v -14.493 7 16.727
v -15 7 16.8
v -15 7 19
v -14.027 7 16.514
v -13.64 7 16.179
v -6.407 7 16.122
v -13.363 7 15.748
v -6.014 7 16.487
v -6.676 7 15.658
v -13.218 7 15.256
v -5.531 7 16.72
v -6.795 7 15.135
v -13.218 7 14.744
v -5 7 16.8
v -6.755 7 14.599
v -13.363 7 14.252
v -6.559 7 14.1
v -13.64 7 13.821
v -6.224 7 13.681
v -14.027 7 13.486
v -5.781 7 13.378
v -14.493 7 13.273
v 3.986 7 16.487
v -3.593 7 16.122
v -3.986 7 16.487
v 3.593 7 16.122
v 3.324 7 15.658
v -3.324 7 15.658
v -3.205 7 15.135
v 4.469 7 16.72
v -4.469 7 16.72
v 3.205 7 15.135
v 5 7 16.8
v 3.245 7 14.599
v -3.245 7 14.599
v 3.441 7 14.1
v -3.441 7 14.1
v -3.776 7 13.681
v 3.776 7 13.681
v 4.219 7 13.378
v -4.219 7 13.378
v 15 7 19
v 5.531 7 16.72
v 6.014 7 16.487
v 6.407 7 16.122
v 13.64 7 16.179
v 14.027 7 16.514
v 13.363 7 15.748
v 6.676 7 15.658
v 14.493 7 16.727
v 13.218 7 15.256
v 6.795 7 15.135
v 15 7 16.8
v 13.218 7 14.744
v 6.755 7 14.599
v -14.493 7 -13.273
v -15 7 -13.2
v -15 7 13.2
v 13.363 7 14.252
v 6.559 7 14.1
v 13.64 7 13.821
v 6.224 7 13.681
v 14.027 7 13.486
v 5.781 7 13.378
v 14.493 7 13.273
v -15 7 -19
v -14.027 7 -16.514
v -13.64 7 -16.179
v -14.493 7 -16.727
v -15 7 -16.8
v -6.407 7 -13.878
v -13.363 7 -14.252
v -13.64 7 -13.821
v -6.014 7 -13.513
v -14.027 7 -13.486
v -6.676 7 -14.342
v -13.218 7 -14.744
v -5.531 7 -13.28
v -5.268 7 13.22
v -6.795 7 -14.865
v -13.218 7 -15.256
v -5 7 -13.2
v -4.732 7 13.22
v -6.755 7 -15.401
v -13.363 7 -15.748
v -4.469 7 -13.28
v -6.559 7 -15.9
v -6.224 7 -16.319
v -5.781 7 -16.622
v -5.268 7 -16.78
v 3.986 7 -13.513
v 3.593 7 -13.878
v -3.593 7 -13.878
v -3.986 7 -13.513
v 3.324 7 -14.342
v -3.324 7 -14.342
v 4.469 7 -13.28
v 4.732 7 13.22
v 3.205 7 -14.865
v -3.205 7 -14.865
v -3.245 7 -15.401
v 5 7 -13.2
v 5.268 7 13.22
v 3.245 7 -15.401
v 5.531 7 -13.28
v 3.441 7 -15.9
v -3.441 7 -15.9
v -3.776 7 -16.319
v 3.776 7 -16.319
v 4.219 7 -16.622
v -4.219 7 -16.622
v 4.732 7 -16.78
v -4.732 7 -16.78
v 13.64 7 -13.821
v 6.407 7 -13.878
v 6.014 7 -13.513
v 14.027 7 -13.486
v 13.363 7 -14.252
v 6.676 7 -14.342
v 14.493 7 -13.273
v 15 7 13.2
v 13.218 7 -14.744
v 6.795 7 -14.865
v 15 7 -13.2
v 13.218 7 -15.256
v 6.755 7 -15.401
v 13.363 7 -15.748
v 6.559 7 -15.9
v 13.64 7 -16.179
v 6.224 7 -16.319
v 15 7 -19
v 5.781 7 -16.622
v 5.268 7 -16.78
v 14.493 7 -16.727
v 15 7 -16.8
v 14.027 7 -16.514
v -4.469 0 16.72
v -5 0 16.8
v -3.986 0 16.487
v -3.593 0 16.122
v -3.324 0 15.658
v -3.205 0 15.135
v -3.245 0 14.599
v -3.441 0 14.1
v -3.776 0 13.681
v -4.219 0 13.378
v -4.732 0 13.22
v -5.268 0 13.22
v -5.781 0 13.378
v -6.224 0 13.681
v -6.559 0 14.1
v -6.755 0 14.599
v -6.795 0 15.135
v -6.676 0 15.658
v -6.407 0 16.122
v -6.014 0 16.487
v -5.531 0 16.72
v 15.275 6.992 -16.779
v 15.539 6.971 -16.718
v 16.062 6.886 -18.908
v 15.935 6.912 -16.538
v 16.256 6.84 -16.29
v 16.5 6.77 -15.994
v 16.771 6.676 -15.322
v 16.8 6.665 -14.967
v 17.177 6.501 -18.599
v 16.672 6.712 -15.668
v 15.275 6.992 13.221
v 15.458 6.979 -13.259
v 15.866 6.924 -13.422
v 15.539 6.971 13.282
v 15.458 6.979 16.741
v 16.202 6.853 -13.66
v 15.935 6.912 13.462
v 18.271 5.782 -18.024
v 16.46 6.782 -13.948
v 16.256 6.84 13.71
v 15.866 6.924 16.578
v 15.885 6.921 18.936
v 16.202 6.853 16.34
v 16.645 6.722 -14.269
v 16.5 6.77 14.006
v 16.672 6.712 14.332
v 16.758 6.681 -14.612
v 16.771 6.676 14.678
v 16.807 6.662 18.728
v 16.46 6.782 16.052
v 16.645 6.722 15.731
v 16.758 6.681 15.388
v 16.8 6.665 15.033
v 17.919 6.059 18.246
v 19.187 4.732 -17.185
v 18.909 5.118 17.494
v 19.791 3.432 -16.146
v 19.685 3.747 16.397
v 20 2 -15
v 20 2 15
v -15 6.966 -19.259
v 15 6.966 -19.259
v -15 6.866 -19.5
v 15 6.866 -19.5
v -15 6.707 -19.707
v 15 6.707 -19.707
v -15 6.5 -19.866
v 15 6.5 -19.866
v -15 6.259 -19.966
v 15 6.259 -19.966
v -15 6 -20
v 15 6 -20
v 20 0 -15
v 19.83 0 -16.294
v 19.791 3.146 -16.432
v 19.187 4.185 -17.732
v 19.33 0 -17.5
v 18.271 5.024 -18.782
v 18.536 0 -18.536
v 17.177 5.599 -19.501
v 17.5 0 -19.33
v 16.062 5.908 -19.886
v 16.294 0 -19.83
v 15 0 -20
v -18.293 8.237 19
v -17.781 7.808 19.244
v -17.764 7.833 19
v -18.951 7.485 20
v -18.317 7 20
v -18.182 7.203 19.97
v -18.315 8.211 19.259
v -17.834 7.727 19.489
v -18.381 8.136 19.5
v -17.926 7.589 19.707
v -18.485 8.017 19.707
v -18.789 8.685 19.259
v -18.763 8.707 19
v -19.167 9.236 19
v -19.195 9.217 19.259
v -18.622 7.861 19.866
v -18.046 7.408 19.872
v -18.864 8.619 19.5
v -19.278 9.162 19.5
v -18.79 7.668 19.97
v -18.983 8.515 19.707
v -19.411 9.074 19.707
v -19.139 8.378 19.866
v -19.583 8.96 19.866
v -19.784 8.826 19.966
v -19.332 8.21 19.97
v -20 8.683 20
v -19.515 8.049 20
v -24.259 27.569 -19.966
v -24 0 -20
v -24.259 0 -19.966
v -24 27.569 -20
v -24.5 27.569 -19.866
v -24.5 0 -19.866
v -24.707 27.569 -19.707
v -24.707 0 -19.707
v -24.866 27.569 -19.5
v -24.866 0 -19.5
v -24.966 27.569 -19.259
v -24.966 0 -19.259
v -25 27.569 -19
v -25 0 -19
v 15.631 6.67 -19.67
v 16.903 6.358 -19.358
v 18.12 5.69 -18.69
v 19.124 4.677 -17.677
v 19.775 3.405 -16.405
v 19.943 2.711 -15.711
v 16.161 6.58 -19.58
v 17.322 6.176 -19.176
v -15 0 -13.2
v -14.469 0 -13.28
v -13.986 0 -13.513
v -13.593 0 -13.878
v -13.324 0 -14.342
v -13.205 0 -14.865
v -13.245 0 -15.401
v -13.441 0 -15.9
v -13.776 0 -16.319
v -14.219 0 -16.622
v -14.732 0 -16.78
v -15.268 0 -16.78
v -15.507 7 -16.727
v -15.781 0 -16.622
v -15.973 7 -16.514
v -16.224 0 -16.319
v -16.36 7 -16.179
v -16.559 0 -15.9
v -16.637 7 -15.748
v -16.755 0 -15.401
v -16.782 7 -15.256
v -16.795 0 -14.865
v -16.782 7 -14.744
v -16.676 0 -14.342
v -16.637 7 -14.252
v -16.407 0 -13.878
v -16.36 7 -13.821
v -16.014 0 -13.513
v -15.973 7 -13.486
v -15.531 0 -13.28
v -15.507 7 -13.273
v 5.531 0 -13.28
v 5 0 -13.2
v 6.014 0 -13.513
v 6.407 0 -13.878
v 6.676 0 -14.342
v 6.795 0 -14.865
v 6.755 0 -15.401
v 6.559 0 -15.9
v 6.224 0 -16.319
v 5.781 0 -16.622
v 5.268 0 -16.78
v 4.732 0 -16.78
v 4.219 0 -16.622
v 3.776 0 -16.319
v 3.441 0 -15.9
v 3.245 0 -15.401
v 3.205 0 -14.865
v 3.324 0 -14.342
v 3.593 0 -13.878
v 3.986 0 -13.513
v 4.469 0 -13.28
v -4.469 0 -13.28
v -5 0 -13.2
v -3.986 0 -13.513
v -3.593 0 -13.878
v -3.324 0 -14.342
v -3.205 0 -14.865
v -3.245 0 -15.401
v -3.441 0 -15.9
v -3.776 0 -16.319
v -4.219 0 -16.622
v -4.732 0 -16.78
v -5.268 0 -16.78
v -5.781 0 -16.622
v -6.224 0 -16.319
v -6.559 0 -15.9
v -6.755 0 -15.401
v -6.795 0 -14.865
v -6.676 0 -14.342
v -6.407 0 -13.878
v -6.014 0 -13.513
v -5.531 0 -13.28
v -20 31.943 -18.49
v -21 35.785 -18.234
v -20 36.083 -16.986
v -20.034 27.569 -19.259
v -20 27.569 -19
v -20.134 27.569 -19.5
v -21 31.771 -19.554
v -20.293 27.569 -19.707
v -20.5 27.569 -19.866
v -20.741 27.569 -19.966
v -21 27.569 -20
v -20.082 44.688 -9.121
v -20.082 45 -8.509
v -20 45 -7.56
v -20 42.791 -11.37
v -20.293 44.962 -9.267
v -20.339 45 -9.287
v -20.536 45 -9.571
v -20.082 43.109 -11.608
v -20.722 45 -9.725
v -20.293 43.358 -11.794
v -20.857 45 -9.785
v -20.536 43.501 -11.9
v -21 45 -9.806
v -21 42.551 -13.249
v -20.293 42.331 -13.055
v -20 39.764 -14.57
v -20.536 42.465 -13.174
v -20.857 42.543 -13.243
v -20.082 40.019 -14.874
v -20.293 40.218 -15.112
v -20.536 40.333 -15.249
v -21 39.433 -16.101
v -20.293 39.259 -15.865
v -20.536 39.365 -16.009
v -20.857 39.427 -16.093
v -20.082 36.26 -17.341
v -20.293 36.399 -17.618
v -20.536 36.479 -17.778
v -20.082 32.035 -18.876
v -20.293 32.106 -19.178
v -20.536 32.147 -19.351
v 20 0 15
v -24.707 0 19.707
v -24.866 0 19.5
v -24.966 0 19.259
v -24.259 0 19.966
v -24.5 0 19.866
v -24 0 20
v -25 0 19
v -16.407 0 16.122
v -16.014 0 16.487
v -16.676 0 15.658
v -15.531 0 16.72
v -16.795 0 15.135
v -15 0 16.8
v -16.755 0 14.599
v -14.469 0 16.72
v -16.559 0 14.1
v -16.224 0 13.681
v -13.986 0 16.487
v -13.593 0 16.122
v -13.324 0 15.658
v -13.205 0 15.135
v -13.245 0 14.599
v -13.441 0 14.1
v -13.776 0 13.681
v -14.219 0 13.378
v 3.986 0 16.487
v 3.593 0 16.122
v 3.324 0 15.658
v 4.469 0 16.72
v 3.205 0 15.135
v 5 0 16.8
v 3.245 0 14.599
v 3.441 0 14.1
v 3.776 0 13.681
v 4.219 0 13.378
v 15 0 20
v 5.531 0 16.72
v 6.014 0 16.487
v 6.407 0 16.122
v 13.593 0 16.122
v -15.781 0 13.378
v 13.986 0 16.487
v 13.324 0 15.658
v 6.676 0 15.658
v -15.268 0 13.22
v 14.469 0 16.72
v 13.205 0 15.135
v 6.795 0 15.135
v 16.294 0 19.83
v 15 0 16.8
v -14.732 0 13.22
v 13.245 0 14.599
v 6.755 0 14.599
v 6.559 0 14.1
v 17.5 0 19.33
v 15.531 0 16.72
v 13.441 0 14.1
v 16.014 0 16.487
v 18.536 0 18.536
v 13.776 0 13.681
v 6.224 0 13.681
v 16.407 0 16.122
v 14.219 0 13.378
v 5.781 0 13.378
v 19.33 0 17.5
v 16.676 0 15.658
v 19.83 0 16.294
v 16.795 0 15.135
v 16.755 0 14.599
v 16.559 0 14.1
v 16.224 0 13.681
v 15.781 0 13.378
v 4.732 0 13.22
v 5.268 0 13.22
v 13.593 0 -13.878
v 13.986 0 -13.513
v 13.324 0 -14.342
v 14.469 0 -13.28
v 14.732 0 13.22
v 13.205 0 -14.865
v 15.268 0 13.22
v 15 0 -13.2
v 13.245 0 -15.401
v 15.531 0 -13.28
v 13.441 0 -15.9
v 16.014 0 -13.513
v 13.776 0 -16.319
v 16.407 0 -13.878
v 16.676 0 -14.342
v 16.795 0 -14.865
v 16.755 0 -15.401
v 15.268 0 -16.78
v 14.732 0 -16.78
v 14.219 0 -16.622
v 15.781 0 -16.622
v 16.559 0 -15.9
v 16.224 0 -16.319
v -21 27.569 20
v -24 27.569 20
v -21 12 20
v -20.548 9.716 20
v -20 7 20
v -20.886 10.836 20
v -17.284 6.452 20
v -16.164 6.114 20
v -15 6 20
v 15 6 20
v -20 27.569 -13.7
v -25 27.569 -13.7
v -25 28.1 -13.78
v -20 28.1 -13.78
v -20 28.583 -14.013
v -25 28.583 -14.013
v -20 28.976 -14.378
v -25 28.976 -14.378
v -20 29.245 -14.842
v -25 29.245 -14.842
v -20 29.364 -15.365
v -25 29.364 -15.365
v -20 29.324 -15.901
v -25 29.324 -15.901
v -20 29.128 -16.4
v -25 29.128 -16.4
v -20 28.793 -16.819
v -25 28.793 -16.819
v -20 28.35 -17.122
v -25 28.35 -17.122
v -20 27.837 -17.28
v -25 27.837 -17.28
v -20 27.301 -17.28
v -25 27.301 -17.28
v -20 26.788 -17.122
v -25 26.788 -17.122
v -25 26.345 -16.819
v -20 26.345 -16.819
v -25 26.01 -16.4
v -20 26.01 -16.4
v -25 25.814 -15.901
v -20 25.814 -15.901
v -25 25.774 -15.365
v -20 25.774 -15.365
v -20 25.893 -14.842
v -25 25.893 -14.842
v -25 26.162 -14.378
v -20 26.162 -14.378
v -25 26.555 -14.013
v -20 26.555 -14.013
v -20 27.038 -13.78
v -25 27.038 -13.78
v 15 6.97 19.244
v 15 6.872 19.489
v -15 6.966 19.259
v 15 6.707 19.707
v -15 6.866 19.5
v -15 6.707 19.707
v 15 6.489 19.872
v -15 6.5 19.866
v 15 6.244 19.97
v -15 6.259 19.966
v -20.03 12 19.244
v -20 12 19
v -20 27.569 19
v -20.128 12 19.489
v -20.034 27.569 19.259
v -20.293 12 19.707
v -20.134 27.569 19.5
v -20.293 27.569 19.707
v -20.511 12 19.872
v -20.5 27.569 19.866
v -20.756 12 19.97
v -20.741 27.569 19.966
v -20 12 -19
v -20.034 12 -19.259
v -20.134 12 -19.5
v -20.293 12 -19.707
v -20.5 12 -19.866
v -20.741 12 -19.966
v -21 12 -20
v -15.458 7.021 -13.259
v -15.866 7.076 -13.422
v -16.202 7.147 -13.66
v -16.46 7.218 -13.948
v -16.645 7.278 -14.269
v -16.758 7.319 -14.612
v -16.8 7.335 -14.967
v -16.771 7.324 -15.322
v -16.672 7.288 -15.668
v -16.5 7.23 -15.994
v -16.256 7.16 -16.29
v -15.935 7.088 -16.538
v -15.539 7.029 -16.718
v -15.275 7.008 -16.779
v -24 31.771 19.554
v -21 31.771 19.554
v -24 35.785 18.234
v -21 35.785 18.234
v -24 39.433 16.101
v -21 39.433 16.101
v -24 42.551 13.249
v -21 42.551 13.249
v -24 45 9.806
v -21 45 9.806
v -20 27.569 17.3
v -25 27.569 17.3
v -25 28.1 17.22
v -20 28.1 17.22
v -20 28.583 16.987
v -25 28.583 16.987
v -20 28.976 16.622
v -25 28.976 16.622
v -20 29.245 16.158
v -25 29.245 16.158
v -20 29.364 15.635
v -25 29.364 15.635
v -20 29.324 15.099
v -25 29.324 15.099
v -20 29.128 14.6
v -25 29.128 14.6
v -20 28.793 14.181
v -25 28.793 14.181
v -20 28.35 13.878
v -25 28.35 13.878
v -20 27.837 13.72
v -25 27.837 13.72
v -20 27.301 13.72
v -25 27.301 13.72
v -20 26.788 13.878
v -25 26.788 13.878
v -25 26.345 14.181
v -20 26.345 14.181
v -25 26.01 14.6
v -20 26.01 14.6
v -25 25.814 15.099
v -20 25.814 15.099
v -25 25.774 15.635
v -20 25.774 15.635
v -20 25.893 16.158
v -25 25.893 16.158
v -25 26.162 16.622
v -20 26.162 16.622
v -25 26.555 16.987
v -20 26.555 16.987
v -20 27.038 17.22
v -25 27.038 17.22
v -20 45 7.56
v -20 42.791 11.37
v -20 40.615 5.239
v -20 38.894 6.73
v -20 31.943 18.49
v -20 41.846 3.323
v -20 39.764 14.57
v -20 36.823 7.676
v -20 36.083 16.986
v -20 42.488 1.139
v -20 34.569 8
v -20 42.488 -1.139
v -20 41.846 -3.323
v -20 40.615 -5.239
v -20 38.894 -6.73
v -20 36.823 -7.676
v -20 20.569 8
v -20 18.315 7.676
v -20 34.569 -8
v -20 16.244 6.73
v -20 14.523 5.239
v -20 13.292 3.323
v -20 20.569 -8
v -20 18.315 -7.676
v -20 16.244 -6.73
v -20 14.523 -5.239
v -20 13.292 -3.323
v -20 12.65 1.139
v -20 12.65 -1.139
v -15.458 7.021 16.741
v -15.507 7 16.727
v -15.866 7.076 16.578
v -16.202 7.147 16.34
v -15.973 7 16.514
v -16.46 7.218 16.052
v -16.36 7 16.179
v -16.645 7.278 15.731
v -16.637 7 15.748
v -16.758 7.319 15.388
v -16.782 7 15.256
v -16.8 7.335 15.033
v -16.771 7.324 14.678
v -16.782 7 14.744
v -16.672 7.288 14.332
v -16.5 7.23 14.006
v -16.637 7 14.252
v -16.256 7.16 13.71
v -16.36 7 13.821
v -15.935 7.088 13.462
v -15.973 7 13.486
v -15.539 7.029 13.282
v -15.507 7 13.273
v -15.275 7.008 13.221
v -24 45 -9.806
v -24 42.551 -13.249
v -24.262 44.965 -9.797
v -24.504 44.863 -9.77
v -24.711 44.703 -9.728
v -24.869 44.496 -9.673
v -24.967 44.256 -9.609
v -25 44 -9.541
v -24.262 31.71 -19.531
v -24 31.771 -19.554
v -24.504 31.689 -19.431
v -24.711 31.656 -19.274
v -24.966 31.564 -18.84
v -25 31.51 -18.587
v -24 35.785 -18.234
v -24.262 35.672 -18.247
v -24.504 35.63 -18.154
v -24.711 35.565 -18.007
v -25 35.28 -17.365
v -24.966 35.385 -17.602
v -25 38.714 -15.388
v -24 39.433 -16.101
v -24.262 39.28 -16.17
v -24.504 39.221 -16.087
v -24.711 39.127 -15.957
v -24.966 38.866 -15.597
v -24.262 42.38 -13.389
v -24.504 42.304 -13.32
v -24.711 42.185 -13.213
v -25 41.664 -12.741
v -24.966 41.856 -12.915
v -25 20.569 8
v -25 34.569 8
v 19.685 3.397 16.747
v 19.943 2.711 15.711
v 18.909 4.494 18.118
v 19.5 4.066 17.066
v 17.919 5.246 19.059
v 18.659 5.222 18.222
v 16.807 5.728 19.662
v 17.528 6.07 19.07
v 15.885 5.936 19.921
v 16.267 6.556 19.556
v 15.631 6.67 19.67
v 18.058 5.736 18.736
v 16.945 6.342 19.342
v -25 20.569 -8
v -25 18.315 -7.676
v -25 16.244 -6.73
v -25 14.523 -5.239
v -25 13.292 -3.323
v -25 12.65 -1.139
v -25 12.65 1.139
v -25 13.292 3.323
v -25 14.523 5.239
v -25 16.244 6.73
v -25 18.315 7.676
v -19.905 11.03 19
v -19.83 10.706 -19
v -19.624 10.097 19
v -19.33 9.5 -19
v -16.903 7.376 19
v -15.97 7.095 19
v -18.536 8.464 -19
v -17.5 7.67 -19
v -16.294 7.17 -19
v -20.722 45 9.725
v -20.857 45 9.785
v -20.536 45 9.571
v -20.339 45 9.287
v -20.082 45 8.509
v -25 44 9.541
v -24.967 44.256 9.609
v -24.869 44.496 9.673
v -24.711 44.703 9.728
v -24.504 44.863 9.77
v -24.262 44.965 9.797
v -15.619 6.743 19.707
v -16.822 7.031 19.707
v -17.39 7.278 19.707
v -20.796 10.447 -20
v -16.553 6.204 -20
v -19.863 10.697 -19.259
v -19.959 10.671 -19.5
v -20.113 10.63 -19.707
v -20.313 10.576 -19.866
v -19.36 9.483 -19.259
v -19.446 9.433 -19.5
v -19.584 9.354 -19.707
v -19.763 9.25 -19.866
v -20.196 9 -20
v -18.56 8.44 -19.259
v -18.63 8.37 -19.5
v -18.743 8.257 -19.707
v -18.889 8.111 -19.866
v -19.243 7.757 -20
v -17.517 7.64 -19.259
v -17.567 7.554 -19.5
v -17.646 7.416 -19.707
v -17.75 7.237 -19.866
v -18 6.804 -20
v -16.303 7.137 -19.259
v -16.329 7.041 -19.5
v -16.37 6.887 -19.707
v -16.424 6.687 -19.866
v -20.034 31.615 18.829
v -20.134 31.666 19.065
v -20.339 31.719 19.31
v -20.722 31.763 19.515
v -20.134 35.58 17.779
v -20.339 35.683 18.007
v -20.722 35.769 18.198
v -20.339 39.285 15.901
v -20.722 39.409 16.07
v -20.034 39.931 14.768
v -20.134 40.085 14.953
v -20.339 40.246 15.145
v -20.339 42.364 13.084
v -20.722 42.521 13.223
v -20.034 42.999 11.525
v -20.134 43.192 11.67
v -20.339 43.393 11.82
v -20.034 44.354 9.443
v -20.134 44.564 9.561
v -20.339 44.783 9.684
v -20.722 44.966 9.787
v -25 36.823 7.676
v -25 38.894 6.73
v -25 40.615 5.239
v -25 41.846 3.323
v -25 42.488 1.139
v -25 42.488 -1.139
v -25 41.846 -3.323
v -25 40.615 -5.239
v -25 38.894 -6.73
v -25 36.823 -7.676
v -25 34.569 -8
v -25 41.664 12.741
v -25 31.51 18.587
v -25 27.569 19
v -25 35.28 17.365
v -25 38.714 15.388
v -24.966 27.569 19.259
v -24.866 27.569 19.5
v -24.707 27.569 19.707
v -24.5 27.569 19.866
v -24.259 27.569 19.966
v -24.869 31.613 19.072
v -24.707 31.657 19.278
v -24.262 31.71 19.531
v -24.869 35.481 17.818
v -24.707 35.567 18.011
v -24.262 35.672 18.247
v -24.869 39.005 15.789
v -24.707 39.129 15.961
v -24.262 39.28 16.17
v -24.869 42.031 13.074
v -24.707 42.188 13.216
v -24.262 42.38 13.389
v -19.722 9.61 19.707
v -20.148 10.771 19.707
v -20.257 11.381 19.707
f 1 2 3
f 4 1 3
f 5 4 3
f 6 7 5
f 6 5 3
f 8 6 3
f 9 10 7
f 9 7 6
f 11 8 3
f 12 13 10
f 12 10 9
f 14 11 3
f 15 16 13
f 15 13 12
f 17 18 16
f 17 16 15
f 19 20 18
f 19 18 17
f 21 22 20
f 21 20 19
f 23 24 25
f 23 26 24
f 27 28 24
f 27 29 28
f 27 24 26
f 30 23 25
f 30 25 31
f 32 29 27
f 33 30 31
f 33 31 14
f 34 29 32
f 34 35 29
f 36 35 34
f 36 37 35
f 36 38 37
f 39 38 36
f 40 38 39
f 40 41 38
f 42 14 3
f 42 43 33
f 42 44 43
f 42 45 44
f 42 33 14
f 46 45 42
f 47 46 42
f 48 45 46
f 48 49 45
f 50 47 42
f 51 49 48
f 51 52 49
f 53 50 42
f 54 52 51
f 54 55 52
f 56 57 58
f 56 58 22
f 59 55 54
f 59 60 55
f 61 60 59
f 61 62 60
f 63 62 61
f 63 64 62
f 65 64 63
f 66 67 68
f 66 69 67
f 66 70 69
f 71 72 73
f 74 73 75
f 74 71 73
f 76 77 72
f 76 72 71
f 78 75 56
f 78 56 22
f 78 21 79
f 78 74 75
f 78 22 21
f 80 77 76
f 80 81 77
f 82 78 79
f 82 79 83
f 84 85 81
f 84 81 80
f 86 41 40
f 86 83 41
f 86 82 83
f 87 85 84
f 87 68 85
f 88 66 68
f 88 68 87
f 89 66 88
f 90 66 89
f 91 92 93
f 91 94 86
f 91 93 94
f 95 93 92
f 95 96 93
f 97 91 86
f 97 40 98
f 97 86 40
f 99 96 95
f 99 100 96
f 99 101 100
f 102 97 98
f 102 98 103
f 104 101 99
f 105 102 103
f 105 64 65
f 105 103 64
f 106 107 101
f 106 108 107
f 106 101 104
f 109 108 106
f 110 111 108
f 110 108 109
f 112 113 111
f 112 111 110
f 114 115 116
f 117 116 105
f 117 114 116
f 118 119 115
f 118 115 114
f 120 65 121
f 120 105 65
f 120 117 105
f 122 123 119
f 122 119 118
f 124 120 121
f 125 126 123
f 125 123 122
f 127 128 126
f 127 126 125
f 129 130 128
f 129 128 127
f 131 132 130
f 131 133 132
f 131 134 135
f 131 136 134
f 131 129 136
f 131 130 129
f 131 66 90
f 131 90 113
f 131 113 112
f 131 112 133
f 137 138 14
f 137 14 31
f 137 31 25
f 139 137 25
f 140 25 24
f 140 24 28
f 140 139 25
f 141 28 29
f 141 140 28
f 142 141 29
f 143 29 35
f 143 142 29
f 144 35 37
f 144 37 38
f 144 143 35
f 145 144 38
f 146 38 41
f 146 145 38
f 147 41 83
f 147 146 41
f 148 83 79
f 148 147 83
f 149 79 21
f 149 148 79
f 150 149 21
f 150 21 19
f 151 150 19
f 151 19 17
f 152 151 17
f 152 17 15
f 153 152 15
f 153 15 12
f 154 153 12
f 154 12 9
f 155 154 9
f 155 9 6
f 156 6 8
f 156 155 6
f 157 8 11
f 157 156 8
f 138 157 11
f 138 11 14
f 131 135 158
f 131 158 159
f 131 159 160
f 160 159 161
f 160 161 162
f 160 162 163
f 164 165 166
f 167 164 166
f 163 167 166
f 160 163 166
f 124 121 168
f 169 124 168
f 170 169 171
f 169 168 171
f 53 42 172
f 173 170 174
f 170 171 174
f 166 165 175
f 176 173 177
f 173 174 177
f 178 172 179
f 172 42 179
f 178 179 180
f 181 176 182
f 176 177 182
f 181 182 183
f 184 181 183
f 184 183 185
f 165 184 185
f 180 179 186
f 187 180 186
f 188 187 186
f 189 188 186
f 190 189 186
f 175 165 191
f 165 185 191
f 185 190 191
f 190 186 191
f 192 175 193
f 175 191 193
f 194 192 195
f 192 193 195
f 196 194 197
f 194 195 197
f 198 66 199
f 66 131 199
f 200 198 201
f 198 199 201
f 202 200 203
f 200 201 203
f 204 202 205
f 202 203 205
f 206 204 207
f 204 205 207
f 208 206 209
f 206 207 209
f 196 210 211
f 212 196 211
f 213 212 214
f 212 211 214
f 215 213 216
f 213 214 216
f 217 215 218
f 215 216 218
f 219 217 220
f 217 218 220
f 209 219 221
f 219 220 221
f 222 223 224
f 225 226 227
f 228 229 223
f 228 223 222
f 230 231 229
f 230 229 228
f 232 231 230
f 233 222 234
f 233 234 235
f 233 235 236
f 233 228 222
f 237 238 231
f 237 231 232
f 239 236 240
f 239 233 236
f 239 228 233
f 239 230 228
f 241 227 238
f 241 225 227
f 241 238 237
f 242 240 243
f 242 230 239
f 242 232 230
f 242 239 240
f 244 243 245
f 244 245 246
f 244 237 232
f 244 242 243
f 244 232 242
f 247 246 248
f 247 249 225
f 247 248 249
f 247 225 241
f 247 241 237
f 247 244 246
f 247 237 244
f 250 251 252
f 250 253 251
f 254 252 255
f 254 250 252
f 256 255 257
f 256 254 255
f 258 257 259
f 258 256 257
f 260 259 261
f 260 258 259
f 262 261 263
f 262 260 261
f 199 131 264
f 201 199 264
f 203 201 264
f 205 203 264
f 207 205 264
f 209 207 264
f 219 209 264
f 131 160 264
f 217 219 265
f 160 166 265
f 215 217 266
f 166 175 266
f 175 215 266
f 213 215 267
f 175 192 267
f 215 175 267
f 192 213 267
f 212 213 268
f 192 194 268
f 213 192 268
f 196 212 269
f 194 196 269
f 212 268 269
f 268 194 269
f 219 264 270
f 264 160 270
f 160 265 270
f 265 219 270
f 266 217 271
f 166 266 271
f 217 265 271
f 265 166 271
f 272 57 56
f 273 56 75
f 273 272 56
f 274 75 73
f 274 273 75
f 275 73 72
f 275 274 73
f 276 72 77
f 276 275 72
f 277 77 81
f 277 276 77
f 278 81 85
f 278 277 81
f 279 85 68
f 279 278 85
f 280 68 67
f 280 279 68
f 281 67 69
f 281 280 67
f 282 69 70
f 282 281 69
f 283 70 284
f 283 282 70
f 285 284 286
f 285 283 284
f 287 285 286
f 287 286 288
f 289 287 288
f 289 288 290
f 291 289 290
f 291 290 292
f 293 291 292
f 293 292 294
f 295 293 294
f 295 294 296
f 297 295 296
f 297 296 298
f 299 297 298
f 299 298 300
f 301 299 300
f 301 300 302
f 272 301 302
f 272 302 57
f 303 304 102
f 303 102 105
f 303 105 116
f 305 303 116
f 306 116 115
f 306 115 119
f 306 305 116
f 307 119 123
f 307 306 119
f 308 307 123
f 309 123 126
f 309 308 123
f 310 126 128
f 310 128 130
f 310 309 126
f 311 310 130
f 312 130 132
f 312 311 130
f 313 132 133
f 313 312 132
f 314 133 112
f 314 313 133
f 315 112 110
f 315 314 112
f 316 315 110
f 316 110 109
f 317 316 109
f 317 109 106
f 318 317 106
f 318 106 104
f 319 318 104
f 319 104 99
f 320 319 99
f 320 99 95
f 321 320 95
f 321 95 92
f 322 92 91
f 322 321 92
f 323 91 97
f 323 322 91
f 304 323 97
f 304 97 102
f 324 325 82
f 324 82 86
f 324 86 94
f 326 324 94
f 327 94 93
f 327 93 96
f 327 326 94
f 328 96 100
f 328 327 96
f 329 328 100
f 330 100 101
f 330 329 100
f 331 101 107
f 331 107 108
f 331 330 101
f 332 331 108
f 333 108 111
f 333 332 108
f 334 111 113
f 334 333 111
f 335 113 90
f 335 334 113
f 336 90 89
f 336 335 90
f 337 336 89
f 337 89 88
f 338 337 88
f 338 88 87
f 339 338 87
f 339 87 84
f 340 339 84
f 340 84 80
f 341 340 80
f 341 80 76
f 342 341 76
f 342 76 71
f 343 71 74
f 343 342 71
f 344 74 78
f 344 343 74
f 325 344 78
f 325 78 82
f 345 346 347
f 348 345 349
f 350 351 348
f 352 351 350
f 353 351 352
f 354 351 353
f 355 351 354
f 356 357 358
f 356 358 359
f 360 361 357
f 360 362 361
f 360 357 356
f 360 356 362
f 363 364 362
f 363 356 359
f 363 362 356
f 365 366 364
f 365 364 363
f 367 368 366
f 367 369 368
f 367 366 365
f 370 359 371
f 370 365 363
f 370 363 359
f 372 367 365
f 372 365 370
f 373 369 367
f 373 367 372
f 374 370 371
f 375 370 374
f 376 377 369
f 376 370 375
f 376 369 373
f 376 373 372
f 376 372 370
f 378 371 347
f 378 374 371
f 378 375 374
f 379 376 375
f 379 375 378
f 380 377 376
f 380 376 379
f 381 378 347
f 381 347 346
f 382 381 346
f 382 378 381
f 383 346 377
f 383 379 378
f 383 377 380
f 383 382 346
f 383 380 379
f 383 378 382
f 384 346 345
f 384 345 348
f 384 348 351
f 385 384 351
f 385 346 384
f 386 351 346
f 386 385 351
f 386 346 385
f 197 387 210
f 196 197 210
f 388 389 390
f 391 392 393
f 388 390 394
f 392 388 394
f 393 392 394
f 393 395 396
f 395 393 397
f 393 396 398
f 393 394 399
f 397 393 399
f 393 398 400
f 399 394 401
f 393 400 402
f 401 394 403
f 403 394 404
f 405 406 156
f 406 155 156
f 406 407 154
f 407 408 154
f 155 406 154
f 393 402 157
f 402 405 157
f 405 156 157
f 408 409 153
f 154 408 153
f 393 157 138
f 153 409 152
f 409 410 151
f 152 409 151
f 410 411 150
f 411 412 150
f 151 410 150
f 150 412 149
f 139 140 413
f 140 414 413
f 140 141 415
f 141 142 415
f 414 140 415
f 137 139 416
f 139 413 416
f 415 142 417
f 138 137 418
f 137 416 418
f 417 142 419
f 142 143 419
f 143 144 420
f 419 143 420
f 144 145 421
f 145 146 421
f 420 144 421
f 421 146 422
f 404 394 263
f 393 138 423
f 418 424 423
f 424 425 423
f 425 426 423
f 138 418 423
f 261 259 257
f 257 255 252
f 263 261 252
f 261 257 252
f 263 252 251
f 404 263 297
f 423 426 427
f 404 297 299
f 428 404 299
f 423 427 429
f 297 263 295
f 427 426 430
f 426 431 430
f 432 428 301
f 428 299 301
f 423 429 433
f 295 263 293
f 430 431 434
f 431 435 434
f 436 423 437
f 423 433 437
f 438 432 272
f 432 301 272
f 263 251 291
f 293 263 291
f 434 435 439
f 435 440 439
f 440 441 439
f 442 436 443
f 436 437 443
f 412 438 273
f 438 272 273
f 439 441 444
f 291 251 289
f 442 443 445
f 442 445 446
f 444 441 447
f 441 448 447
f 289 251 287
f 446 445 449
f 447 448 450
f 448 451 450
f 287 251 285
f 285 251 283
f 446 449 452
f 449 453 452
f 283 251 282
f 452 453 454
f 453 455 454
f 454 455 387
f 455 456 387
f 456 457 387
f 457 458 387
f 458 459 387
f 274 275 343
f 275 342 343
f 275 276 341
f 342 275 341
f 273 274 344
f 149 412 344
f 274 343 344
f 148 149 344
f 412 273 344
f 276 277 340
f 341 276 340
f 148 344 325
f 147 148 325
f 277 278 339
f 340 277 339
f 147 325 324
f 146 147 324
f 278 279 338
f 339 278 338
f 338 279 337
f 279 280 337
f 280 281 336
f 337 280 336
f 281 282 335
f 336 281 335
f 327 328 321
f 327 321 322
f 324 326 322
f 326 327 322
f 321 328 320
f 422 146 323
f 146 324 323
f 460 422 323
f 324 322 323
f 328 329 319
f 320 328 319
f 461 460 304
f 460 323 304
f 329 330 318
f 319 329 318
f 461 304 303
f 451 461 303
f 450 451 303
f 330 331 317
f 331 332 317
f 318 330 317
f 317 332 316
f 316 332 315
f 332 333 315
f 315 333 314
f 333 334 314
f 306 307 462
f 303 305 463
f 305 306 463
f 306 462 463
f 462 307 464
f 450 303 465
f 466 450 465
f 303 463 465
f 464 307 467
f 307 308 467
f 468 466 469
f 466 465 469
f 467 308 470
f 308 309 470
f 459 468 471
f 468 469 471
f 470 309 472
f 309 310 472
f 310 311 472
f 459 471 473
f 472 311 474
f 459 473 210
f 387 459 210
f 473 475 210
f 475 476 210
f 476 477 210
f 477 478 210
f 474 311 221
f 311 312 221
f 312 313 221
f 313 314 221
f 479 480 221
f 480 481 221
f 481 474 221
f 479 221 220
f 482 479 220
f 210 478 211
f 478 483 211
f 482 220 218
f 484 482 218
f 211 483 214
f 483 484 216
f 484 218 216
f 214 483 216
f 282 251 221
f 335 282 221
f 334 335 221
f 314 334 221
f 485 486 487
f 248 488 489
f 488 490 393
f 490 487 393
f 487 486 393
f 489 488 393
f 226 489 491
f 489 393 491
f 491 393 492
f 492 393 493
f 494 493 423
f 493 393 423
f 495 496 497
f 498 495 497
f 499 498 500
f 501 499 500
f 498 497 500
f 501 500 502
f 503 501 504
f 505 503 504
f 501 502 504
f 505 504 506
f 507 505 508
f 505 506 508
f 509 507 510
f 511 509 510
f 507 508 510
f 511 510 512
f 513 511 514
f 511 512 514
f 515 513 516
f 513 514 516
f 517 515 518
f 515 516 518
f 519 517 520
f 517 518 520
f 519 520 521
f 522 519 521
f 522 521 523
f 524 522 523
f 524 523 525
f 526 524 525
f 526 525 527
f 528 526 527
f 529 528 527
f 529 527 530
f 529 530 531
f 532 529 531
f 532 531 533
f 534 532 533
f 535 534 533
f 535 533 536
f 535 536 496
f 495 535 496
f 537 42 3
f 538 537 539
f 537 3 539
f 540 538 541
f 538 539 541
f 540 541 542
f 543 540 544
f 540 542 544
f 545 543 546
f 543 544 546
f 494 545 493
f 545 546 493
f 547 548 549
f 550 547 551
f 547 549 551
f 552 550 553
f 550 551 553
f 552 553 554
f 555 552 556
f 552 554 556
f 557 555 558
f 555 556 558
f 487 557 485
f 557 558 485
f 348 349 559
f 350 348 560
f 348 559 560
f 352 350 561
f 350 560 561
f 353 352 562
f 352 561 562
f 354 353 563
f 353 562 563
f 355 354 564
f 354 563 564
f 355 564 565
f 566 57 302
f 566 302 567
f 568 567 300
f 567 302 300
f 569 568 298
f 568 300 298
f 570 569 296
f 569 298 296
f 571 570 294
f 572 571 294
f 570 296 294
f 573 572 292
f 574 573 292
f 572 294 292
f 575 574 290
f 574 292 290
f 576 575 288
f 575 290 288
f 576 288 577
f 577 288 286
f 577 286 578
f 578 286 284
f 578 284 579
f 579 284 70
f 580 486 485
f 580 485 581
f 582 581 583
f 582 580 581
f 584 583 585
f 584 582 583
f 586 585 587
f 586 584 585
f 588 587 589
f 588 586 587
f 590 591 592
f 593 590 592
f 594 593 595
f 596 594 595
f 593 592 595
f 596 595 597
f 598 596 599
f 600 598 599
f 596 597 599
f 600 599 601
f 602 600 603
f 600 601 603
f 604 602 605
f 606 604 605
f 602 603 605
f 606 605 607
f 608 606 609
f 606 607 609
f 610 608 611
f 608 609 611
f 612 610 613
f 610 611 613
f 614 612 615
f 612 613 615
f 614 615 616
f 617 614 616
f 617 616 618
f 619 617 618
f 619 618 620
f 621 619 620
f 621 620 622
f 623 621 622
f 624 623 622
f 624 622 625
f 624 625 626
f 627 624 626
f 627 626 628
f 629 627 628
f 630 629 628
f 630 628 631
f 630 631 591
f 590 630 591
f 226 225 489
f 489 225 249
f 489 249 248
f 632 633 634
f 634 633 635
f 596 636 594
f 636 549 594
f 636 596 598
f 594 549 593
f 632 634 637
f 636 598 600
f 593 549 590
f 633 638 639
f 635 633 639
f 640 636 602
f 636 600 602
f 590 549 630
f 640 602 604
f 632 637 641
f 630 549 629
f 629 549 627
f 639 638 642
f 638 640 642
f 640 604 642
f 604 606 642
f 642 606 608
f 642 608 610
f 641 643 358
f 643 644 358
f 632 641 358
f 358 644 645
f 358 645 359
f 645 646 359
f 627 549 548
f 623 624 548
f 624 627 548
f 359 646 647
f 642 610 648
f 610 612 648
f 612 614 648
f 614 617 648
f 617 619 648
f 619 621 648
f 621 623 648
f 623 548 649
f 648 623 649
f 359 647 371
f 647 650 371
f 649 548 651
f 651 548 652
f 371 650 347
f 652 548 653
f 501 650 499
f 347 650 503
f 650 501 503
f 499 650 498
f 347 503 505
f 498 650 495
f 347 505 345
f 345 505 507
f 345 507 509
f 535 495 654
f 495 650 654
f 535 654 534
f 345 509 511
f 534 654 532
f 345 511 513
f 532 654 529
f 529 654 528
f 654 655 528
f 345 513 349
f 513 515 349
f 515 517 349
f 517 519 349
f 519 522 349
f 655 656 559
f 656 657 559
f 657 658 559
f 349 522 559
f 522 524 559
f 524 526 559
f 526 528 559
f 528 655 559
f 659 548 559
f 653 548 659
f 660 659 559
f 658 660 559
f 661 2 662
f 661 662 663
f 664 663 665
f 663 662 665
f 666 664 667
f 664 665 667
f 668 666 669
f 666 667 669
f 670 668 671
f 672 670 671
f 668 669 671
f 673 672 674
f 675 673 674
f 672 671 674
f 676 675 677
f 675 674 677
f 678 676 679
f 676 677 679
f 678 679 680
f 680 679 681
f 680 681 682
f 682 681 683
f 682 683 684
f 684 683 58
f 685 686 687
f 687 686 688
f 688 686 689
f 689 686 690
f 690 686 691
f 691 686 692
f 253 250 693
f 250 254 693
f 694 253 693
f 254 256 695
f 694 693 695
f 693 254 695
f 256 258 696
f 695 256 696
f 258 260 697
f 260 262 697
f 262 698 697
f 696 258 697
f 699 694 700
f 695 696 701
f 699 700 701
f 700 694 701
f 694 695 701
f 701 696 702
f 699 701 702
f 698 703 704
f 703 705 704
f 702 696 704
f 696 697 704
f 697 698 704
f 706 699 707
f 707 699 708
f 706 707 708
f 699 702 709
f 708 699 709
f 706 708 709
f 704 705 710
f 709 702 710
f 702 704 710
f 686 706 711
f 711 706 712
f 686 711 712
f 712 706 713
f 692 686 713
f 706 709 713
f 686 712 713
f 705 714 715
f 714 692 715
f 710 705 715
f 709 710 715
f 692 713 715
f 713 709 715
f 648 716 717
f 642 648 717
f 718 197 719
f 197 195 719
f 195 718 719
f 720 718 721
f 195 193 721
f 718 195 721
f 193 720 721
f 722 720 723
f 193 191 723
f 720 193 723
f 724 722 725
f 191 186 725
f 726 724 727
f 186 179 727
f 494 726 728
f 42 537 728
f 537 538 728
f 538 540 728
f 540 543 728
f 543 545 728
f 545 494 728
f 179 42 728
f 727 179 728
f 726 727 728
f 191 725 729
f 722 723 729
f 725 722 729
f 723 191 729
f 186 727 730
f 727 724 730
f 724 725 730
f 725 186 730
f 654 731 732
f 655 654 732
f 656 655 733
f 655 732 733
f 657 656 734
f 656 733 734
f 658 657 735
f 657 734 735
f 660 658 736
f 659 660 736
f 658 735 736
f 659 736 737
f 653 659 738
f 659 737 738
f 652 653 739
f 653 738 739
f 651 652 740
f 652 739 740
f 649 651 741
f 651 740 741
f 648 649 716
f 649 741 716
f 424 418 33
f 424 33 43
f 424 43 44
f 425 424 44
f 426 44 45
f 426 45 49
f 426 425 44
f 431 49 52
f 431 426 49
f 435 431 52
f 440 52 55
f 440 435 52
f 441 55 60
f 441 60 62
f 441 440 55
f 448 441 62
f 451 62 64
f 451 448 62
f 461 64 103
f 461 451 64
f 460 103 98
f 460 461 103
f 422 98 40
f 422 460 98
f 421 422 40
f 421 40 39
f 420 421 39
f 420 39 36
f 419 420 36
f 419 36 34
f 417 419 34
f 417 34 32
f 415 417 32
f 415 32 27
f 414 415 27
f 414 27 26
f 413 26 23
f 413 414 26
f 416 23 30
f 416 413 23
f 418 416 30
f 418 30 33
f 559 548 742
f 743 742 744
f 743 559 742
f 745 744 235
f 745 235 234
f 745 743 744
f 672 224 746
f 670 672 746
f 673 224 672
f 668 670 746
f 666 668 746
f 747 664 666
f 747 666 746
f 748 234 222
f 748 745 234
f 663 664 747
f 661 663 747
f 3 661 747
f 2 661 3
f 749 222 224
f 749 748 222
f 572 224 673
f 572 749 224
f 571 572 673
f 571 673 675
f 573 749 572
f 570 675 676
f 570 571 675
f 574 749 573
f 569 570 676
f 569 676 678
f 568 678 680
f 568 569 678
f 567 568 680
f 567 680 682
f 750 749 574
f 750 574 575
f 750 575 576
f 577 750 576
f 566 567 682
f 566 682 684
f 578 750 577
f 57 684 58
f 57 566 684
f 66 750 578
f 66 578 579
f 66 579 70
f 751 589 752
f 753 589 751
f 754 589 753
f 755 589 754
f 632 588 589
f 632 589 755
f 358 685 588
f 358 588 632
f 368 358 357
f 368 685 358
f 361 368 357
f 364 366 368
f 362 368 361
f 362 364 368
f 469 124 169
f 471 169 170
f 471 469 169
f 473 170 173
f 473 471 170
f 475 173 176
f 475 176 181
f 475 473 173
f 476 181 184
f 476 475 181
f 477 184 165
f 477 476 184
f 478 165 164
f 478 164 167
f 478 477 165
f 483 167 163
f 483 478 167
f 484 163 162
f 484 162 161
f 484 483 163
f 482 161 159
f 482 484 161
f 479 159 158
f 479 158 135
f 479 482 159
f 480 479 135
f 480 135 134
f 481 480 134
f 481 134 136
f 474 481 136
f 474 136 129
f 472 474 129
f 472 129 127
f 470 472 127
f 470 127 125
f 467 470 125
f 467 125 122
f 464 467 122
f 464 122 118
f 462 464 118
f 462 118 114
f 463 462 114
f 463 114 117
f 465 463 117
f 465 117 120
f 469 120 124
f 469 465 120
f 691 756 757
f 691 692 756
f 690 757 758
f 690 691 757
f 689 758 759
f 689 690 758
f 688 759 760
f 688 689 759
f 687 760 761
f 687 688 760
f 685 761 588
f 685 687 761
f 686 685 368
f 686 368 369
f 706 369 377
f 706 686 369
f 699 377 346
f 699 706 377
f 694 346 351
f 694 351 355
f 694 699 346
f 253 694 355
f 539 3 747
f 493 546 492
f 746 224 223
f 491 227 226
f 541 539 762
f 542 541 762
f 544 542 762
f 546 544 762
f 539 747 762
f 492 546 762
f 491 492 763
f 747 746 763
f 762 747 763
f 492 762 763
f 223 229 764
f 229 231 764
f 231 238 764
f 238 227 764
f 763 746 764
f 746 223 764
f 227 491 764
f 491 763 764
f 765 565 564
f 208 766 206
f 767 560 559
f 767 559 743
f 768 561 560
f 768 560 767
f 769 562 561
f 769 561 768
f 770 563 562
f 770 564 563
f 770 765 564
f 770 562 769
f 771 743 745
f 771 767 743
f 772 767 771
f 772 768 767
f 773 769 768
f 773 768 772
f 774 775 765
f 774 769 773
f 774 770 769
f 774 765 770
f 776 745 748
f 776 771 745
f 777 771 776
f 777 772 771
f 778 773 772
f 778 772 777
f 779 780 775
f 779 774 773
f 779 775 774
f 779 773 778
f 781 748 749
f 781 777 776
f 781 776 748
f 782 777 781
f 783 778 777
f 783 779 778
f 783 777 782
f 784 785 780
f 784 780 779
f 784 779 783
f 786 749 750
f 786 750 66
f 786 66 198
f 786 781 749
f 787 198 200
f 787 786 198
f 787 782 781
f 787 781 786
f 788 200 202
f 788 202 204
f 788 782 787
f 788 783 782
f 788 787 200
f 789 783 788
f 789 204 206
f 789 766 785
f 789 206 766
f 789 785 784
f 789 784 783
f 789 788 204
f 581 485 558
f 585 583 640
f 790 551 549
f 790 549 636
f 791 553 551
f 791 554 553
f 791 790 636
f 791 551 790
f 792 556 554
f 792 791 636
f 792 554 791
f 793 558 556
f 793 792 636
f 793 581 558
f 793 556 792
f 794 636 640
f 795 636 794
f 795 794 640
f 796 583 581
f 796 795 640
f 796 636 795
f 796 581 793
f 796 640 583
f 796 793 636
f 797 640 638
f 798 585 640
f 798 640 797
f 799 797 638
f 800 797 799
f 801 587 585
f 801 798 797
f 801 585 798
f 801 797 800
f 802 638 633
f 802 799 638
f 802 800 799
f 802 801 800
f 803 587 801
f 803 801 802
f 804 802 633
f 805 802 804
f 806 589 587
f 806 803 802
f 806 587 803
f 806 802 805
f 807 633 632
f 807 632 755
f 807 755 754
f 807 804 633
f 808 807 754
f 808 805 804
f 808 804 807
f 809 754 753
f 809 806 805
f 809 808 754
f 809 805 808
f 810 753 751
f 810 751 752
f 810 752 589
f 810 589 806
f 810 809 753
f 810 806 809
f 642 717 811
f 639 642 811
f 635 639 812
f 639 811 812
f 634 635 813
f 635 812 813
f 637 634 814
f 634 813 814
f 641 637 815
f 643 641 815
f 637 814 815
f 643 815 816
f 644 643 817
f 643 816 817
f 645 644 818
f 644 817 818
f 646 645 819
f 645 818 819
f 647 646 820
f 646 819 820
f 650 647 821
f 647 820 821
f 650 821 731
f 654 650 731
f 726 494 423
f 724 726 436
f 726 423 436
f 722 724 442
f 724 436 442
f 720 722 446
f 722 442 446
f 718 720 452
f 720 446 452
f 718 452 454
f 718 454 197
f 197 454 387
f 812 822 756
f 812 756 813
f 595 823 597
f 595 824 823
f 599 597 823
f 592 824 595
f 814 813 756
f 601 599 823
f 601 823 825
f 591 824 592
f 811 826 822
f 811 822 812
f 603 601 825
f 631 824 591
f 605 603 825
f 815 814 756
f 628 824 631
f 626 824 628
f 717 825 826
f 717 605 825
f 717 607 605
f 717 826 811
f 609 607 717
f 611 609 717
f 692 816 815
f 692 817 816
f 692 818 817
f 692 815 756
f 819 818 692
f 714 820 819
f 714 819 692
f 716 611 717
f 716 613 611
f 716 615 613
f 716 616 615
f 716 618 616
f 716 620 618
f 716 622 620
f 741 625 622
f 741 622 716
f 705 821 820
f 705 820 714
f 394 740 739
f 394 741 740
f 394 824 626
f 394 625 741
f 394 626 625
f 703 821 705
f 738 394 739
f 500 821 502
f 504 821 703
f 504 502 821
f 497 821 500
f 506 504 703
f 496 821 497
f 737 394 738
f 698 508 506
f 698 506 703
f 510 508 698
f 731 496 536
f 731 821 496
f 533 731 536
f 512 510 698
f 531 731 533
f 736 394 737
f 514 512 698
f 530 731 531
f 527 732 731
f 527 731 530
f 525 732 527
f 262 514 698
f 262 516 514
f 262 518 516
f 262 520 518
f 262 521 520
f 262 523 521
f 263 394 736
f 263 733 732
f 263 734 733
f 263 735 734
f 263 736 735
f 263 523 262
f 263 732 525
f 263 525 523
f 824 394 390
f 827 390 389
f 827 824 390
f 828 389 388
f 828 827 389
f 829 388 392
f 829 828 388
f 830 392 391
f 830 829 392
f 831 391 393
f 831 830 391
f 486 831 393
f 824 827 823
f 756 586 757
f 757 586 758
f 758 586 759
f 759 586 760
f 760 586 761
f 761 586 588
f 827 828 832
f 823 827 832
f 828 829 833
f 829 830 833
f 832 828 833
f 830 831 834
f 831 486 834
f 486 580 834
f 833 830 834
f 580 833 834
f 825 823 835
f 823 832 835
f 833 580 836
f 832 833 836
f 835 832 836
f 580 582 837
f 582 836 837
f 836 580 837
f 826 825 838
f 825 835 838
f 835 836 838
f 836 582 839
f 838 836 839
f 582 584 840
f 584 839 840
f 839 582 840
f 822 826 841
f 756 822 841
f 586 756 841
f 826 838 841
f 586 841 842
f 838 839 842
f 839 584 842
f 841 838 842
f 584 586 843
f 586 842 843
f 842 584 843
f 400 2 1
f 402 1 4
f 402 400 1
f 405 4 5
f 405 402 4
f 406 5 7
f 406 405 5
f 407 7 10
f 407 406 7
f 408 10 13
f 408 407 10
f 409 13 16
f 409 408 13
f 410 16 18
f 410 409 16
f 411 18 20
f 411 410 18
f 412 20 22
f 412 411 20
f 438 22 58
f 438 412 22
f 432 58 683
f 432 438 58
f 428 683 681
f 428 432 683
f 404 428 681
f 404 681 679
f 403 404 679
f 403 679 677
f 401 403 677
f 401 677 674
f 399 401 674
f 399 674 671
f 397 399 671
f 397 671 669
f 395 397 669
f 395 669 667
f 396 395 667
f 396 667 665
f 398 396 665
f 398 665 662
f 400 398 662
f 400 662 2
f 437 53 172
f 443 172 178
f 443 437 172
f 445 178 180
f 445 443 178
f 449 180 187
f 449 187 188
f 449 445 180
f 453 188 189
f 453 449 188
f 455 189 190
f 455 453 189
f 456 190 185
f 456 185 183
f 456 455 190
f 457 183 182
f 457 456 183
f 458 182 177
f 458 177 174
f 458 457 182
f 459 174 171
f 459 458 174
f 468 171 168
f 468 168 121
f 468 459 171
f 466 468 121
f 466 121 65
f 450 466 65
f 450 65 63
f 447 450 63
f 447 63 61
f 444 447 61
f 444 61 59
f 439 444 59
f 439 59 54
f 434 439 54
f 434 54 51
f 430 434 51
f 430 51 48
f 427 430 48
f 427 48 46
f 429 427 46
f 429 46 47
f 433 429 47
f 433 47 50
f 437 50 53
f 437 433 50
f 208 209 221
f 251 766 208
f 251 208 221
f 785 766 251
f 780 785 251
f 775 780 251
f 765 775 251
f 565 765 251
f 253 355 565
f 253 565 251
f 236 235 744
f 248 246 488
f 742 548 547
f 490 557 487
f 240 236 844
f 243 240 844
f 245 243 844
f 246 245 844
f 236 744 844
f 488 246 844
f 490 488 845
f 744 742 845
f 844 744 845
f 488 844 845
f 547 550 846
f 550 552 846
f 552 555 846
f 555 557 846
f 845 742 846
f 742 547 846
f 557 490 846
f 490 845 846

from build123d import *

# Parameters (mm, degrees)
SKETCH1_W           = 40
SKETCH1_H           = 40
SKETCH1_R           = 1.8
BOSS_EXTRUDE1_DEPTH = 7
SKETCH1_3_W         = 5
SKETCH1_3_H         = 40
BOSS_EXTRUDE2_DEPTH = 45
SKETCH2_R           = 1.8
CUT_EXTRUDE1_DEPTH  = 67.708320321
SKETCH2_4_OUTSIDE_W = 57.034
SKETCH2_4_OUTSIDE_H = 62.034
SKETCH2_4_OUTSIDE_R = 1.8
CUT_EXTRUDE2_DEPTH  = 67.708320321
FILLET1_R           = 5
FILLET2_R           = 5
FILLET3_R           = 1


with BuildPart() as part:
    # Sketch1 → Boss-Extrude1 (new body)
    with BuildSketch(Plane(origin=(0, 0, 0), x_dir=(1, 0, 0), z_dir=(0, 1, 0))):
        Rectangle(SKETCH1_W, SKETCH1_H)
        with Locations(Location((-5, -15, 0), (0, 0, 270))):
            Circle(SKETCH1_R, mode=Mode.SUBTRACT)
        with Locations(Location((15, -15, 0), (0, 0, 270))):
            Circle(SKETCH1_R, mode=Mode.SUBTRACT)
        with Locations(Location((-15, 15, 0), (0, 0, 270))):
            Circle(SKETCH1_R, mode=Mode.SUBTRACT)
        with Locations(Location((-5, 15, 0), (0, 0, 270))):
            Circle(SKETCH1_R, mode=Mode.SUBTRACT)
        with Locations(Location((5, 15, 0), (0, 0, 270))):
            Circle(SKETCH1_R, mode=Mode.SUBTRACT)
        with Locations(Location((15, 15, 0), (0, 0, 270))):
            Circle(SKETCH1_R, mode=Mode.SUBTRACT)
        with Locations(Location((5, -15, 0), (0, 0, 270))):
            Circle(SKETCH1_R, mode=Mode.SUBTRACT)
        with Locations(Location((-15, -15, 0), (0, 0, 270))):
            Circle(SKETCH1_R, mode=Mode.SUBTRACT)
    extrude(amount=BOSS_EXTRUDE1_DEPTH)

    # Sketch1<3> → Boss-Extrude2 (add)
    with BuildSketch(Plane(origin=(0, 0, 0), x_dir=(1, 0, 0), z_dir=(0, 1, 0))):
        with Locations((-22.5, 0)):
            Rectangle(SKETCH1_3_W, SKETCH1_3_H)
    extrude(amount=BOSS_EXTRUDE2_DEPTH)

    # Sketch2 → Cut-Extrude1 (cut, through all)
    with BuildSketch(Plane.ZY.offset(25)):
        with Locations((-15.5, 27.569)):
            Circle(SKETCH2_R)
        with BuildLine():
            Line((8, 20.569), (8, 34.569))
            ThreePointArc((8, 34.569), (0, 42.569), (-8, 34.569))
            Line((-8, 34.569), (-8, 20.569))
            ThreePointArc((-8, 20.569), (0, 12.569), (8, 20.569))
        make_face()
        with Locations((15.5, 27.569)):
            Circle(SKETCH2_R)
    extrude(amount=-CUT_EXTRUDE1_DEPTH, mode=Mode.SUBTRACT)

    # Sketch2<4> outside → Cut-Extrude2 (cut, through all)
    # profile 1 of 4: a face of its own
    with BuildSketch(Plane.ZY.offset(25)):
        with Locations((0, 22.5)):
            Rectangle(SKETCH2_4_OUTSIDE_W, SKETCH2_4_OUTSIDE_H)
        with BuildLine():
            Line((-20, 27.569), (-20, 0))
            Line((-20, 0), (20, 0))
            Line((20, 0), (20, 27.569))
            ThreePointArc((20, 27.569), (0, 47.569), (-20, 27.569))
        make_face(mode=Mode.SUBTRACT)
    # profile 2 of 4: a face of its own
    with BuildSketch(Plane.ZY.offset(25)):
        with Locations((-15.5, 27.569)):
            Circle(SKETCH2_4_OUTSIDE_R)
    # profile 3 of 4: a face of its own
    with BuildSketch(Plane.ZY.offset(25)):
        with Locations((15.5, 27.569)):
            Circle(SKETCH2_4_OUTSIDE_R)
    # profile 4 of 4: a face of its own
    with BuildSketch(Plane.ZY.offset(25)):
        with BuildLine():
            Line((-8, 20.569), (-8, 34.569))
            ThreePointArc((-8, 34.569), (0, 42.569), (8, 34.569))
            Line((8, 34.569), (8, 20.569))
            ThreePointArc((8, 20.569), (0, 12.569), (-8, 20.569))
        make_face()
    extrude(amount=-CUT_EXTRUDE2_DEPTH, mode=Mode.SUBTRACT)

    # Fillet1
    # the kernel refuses this fillet: 5 mm, written as the material it adds along each edge
    with BuildSketch(Plane(origin=(-20, 7, -20), x_dir=(1, 0, 0), z_dir=(0, 0, 1))) as fillet1_piece_1_section:
        with BuildLine():
            CenterArc((FILLET1_R, FILLET1_R), FILLET1_R, 180, 90)
            Line((0, FILLET1_R), (0, 0))
            Line((0, 0), (FILLET1_R, 0))
        make_face()
    fillet1_piece_1 = extrude(amount=40, mode=Mode.PRIVATE)
    fillet1_piece_1 = fillet1_piece_1 - Plane(origin=(-15, 8.140202128, -15), x_dir=(0, 0, 1), z_dir=(0, -1, 0)) * Cylinder(1.8, 100, mode=Mode.PRIVATE)
    fillet1_piece_1 = fillet1_piece_1 - Plane(origin=(-15, 8.140202128, 15), x_dir=(0, 0, 1), z_dir=(0, -1, 0)) * Cylinder(1.8, 100, mode=Mode.PRIVATE)
    add(fillet1_piece_1)

    # Fillet2
    # the kernel refuses this fillet: 5 mm, written as the material it takes off along each edge
    with BuildSketch(Plane(origin=(20, -12.5, -20), x_dir=(-1, 0, 0), z_dir=(0, 1, 0)), Plane(origin=(20, -12.5, 20), x_dir=(0, 0, -1), z_dir=(0, 1, 0))) as fillet2_piece_1:
        with BuildLine():
            CenterArc((FILLET2_R, FILLET2_R), FILLET2_R, 180, 90)
            Line((0, FILLET2_R), (0, 0))
            Line((0, 0), (FILLET2_R, 0))
        make_face()
    extrude(amount=32, mode=Mode.SUBTRACT)
    with BuildSketch(Plane(origin=(20, 7, 32.5), x_dir=(-1, 0, 0), z_dir=(0, 0, -1))) as fillet2_piece_2:
        with BuildLine():
            CenterArc((FILLET2_R, -FILLET2_R), FILLET2_R, 90, 90)
            Line((0, -FILLET2_R), (0, 0))
            Line((0, 0), (FILLET2_R, 0))
        make_face()
    extrude(amount=65, mode=Mode.SUBTRACT)

    # Fillet3
    fillet3_edges = [part.edges().sort_by_distance(p)[0] for p in [
        (-20, 37.665468331, -17.264452706),
        (-20, 37.665468331, 17.264452706),
        (0, 7, 20),
        (0, 7, -20),
        (-18.535533906, 8.464466094, -20),
        (-18.535533906, 8.464466094, 20),
        (18.816480084, 5.230244537, 18.230244537),
        (18.816480084, 5.230244537, -18.230244537),
        (-25, 45, 0),
        (-25, 13.7845, -20),
        (-20, 19.7845, -20),
        (-20, 19.7845, 20),
        (-25, 13.7845, 20),
        (-25, 37.665468331, -17.264452706),
        (-25, 37.665468331, 17.264452706),
    ]]
    fillet(fillet3_edges, radius=FILLET3_R)


solid = part.part
